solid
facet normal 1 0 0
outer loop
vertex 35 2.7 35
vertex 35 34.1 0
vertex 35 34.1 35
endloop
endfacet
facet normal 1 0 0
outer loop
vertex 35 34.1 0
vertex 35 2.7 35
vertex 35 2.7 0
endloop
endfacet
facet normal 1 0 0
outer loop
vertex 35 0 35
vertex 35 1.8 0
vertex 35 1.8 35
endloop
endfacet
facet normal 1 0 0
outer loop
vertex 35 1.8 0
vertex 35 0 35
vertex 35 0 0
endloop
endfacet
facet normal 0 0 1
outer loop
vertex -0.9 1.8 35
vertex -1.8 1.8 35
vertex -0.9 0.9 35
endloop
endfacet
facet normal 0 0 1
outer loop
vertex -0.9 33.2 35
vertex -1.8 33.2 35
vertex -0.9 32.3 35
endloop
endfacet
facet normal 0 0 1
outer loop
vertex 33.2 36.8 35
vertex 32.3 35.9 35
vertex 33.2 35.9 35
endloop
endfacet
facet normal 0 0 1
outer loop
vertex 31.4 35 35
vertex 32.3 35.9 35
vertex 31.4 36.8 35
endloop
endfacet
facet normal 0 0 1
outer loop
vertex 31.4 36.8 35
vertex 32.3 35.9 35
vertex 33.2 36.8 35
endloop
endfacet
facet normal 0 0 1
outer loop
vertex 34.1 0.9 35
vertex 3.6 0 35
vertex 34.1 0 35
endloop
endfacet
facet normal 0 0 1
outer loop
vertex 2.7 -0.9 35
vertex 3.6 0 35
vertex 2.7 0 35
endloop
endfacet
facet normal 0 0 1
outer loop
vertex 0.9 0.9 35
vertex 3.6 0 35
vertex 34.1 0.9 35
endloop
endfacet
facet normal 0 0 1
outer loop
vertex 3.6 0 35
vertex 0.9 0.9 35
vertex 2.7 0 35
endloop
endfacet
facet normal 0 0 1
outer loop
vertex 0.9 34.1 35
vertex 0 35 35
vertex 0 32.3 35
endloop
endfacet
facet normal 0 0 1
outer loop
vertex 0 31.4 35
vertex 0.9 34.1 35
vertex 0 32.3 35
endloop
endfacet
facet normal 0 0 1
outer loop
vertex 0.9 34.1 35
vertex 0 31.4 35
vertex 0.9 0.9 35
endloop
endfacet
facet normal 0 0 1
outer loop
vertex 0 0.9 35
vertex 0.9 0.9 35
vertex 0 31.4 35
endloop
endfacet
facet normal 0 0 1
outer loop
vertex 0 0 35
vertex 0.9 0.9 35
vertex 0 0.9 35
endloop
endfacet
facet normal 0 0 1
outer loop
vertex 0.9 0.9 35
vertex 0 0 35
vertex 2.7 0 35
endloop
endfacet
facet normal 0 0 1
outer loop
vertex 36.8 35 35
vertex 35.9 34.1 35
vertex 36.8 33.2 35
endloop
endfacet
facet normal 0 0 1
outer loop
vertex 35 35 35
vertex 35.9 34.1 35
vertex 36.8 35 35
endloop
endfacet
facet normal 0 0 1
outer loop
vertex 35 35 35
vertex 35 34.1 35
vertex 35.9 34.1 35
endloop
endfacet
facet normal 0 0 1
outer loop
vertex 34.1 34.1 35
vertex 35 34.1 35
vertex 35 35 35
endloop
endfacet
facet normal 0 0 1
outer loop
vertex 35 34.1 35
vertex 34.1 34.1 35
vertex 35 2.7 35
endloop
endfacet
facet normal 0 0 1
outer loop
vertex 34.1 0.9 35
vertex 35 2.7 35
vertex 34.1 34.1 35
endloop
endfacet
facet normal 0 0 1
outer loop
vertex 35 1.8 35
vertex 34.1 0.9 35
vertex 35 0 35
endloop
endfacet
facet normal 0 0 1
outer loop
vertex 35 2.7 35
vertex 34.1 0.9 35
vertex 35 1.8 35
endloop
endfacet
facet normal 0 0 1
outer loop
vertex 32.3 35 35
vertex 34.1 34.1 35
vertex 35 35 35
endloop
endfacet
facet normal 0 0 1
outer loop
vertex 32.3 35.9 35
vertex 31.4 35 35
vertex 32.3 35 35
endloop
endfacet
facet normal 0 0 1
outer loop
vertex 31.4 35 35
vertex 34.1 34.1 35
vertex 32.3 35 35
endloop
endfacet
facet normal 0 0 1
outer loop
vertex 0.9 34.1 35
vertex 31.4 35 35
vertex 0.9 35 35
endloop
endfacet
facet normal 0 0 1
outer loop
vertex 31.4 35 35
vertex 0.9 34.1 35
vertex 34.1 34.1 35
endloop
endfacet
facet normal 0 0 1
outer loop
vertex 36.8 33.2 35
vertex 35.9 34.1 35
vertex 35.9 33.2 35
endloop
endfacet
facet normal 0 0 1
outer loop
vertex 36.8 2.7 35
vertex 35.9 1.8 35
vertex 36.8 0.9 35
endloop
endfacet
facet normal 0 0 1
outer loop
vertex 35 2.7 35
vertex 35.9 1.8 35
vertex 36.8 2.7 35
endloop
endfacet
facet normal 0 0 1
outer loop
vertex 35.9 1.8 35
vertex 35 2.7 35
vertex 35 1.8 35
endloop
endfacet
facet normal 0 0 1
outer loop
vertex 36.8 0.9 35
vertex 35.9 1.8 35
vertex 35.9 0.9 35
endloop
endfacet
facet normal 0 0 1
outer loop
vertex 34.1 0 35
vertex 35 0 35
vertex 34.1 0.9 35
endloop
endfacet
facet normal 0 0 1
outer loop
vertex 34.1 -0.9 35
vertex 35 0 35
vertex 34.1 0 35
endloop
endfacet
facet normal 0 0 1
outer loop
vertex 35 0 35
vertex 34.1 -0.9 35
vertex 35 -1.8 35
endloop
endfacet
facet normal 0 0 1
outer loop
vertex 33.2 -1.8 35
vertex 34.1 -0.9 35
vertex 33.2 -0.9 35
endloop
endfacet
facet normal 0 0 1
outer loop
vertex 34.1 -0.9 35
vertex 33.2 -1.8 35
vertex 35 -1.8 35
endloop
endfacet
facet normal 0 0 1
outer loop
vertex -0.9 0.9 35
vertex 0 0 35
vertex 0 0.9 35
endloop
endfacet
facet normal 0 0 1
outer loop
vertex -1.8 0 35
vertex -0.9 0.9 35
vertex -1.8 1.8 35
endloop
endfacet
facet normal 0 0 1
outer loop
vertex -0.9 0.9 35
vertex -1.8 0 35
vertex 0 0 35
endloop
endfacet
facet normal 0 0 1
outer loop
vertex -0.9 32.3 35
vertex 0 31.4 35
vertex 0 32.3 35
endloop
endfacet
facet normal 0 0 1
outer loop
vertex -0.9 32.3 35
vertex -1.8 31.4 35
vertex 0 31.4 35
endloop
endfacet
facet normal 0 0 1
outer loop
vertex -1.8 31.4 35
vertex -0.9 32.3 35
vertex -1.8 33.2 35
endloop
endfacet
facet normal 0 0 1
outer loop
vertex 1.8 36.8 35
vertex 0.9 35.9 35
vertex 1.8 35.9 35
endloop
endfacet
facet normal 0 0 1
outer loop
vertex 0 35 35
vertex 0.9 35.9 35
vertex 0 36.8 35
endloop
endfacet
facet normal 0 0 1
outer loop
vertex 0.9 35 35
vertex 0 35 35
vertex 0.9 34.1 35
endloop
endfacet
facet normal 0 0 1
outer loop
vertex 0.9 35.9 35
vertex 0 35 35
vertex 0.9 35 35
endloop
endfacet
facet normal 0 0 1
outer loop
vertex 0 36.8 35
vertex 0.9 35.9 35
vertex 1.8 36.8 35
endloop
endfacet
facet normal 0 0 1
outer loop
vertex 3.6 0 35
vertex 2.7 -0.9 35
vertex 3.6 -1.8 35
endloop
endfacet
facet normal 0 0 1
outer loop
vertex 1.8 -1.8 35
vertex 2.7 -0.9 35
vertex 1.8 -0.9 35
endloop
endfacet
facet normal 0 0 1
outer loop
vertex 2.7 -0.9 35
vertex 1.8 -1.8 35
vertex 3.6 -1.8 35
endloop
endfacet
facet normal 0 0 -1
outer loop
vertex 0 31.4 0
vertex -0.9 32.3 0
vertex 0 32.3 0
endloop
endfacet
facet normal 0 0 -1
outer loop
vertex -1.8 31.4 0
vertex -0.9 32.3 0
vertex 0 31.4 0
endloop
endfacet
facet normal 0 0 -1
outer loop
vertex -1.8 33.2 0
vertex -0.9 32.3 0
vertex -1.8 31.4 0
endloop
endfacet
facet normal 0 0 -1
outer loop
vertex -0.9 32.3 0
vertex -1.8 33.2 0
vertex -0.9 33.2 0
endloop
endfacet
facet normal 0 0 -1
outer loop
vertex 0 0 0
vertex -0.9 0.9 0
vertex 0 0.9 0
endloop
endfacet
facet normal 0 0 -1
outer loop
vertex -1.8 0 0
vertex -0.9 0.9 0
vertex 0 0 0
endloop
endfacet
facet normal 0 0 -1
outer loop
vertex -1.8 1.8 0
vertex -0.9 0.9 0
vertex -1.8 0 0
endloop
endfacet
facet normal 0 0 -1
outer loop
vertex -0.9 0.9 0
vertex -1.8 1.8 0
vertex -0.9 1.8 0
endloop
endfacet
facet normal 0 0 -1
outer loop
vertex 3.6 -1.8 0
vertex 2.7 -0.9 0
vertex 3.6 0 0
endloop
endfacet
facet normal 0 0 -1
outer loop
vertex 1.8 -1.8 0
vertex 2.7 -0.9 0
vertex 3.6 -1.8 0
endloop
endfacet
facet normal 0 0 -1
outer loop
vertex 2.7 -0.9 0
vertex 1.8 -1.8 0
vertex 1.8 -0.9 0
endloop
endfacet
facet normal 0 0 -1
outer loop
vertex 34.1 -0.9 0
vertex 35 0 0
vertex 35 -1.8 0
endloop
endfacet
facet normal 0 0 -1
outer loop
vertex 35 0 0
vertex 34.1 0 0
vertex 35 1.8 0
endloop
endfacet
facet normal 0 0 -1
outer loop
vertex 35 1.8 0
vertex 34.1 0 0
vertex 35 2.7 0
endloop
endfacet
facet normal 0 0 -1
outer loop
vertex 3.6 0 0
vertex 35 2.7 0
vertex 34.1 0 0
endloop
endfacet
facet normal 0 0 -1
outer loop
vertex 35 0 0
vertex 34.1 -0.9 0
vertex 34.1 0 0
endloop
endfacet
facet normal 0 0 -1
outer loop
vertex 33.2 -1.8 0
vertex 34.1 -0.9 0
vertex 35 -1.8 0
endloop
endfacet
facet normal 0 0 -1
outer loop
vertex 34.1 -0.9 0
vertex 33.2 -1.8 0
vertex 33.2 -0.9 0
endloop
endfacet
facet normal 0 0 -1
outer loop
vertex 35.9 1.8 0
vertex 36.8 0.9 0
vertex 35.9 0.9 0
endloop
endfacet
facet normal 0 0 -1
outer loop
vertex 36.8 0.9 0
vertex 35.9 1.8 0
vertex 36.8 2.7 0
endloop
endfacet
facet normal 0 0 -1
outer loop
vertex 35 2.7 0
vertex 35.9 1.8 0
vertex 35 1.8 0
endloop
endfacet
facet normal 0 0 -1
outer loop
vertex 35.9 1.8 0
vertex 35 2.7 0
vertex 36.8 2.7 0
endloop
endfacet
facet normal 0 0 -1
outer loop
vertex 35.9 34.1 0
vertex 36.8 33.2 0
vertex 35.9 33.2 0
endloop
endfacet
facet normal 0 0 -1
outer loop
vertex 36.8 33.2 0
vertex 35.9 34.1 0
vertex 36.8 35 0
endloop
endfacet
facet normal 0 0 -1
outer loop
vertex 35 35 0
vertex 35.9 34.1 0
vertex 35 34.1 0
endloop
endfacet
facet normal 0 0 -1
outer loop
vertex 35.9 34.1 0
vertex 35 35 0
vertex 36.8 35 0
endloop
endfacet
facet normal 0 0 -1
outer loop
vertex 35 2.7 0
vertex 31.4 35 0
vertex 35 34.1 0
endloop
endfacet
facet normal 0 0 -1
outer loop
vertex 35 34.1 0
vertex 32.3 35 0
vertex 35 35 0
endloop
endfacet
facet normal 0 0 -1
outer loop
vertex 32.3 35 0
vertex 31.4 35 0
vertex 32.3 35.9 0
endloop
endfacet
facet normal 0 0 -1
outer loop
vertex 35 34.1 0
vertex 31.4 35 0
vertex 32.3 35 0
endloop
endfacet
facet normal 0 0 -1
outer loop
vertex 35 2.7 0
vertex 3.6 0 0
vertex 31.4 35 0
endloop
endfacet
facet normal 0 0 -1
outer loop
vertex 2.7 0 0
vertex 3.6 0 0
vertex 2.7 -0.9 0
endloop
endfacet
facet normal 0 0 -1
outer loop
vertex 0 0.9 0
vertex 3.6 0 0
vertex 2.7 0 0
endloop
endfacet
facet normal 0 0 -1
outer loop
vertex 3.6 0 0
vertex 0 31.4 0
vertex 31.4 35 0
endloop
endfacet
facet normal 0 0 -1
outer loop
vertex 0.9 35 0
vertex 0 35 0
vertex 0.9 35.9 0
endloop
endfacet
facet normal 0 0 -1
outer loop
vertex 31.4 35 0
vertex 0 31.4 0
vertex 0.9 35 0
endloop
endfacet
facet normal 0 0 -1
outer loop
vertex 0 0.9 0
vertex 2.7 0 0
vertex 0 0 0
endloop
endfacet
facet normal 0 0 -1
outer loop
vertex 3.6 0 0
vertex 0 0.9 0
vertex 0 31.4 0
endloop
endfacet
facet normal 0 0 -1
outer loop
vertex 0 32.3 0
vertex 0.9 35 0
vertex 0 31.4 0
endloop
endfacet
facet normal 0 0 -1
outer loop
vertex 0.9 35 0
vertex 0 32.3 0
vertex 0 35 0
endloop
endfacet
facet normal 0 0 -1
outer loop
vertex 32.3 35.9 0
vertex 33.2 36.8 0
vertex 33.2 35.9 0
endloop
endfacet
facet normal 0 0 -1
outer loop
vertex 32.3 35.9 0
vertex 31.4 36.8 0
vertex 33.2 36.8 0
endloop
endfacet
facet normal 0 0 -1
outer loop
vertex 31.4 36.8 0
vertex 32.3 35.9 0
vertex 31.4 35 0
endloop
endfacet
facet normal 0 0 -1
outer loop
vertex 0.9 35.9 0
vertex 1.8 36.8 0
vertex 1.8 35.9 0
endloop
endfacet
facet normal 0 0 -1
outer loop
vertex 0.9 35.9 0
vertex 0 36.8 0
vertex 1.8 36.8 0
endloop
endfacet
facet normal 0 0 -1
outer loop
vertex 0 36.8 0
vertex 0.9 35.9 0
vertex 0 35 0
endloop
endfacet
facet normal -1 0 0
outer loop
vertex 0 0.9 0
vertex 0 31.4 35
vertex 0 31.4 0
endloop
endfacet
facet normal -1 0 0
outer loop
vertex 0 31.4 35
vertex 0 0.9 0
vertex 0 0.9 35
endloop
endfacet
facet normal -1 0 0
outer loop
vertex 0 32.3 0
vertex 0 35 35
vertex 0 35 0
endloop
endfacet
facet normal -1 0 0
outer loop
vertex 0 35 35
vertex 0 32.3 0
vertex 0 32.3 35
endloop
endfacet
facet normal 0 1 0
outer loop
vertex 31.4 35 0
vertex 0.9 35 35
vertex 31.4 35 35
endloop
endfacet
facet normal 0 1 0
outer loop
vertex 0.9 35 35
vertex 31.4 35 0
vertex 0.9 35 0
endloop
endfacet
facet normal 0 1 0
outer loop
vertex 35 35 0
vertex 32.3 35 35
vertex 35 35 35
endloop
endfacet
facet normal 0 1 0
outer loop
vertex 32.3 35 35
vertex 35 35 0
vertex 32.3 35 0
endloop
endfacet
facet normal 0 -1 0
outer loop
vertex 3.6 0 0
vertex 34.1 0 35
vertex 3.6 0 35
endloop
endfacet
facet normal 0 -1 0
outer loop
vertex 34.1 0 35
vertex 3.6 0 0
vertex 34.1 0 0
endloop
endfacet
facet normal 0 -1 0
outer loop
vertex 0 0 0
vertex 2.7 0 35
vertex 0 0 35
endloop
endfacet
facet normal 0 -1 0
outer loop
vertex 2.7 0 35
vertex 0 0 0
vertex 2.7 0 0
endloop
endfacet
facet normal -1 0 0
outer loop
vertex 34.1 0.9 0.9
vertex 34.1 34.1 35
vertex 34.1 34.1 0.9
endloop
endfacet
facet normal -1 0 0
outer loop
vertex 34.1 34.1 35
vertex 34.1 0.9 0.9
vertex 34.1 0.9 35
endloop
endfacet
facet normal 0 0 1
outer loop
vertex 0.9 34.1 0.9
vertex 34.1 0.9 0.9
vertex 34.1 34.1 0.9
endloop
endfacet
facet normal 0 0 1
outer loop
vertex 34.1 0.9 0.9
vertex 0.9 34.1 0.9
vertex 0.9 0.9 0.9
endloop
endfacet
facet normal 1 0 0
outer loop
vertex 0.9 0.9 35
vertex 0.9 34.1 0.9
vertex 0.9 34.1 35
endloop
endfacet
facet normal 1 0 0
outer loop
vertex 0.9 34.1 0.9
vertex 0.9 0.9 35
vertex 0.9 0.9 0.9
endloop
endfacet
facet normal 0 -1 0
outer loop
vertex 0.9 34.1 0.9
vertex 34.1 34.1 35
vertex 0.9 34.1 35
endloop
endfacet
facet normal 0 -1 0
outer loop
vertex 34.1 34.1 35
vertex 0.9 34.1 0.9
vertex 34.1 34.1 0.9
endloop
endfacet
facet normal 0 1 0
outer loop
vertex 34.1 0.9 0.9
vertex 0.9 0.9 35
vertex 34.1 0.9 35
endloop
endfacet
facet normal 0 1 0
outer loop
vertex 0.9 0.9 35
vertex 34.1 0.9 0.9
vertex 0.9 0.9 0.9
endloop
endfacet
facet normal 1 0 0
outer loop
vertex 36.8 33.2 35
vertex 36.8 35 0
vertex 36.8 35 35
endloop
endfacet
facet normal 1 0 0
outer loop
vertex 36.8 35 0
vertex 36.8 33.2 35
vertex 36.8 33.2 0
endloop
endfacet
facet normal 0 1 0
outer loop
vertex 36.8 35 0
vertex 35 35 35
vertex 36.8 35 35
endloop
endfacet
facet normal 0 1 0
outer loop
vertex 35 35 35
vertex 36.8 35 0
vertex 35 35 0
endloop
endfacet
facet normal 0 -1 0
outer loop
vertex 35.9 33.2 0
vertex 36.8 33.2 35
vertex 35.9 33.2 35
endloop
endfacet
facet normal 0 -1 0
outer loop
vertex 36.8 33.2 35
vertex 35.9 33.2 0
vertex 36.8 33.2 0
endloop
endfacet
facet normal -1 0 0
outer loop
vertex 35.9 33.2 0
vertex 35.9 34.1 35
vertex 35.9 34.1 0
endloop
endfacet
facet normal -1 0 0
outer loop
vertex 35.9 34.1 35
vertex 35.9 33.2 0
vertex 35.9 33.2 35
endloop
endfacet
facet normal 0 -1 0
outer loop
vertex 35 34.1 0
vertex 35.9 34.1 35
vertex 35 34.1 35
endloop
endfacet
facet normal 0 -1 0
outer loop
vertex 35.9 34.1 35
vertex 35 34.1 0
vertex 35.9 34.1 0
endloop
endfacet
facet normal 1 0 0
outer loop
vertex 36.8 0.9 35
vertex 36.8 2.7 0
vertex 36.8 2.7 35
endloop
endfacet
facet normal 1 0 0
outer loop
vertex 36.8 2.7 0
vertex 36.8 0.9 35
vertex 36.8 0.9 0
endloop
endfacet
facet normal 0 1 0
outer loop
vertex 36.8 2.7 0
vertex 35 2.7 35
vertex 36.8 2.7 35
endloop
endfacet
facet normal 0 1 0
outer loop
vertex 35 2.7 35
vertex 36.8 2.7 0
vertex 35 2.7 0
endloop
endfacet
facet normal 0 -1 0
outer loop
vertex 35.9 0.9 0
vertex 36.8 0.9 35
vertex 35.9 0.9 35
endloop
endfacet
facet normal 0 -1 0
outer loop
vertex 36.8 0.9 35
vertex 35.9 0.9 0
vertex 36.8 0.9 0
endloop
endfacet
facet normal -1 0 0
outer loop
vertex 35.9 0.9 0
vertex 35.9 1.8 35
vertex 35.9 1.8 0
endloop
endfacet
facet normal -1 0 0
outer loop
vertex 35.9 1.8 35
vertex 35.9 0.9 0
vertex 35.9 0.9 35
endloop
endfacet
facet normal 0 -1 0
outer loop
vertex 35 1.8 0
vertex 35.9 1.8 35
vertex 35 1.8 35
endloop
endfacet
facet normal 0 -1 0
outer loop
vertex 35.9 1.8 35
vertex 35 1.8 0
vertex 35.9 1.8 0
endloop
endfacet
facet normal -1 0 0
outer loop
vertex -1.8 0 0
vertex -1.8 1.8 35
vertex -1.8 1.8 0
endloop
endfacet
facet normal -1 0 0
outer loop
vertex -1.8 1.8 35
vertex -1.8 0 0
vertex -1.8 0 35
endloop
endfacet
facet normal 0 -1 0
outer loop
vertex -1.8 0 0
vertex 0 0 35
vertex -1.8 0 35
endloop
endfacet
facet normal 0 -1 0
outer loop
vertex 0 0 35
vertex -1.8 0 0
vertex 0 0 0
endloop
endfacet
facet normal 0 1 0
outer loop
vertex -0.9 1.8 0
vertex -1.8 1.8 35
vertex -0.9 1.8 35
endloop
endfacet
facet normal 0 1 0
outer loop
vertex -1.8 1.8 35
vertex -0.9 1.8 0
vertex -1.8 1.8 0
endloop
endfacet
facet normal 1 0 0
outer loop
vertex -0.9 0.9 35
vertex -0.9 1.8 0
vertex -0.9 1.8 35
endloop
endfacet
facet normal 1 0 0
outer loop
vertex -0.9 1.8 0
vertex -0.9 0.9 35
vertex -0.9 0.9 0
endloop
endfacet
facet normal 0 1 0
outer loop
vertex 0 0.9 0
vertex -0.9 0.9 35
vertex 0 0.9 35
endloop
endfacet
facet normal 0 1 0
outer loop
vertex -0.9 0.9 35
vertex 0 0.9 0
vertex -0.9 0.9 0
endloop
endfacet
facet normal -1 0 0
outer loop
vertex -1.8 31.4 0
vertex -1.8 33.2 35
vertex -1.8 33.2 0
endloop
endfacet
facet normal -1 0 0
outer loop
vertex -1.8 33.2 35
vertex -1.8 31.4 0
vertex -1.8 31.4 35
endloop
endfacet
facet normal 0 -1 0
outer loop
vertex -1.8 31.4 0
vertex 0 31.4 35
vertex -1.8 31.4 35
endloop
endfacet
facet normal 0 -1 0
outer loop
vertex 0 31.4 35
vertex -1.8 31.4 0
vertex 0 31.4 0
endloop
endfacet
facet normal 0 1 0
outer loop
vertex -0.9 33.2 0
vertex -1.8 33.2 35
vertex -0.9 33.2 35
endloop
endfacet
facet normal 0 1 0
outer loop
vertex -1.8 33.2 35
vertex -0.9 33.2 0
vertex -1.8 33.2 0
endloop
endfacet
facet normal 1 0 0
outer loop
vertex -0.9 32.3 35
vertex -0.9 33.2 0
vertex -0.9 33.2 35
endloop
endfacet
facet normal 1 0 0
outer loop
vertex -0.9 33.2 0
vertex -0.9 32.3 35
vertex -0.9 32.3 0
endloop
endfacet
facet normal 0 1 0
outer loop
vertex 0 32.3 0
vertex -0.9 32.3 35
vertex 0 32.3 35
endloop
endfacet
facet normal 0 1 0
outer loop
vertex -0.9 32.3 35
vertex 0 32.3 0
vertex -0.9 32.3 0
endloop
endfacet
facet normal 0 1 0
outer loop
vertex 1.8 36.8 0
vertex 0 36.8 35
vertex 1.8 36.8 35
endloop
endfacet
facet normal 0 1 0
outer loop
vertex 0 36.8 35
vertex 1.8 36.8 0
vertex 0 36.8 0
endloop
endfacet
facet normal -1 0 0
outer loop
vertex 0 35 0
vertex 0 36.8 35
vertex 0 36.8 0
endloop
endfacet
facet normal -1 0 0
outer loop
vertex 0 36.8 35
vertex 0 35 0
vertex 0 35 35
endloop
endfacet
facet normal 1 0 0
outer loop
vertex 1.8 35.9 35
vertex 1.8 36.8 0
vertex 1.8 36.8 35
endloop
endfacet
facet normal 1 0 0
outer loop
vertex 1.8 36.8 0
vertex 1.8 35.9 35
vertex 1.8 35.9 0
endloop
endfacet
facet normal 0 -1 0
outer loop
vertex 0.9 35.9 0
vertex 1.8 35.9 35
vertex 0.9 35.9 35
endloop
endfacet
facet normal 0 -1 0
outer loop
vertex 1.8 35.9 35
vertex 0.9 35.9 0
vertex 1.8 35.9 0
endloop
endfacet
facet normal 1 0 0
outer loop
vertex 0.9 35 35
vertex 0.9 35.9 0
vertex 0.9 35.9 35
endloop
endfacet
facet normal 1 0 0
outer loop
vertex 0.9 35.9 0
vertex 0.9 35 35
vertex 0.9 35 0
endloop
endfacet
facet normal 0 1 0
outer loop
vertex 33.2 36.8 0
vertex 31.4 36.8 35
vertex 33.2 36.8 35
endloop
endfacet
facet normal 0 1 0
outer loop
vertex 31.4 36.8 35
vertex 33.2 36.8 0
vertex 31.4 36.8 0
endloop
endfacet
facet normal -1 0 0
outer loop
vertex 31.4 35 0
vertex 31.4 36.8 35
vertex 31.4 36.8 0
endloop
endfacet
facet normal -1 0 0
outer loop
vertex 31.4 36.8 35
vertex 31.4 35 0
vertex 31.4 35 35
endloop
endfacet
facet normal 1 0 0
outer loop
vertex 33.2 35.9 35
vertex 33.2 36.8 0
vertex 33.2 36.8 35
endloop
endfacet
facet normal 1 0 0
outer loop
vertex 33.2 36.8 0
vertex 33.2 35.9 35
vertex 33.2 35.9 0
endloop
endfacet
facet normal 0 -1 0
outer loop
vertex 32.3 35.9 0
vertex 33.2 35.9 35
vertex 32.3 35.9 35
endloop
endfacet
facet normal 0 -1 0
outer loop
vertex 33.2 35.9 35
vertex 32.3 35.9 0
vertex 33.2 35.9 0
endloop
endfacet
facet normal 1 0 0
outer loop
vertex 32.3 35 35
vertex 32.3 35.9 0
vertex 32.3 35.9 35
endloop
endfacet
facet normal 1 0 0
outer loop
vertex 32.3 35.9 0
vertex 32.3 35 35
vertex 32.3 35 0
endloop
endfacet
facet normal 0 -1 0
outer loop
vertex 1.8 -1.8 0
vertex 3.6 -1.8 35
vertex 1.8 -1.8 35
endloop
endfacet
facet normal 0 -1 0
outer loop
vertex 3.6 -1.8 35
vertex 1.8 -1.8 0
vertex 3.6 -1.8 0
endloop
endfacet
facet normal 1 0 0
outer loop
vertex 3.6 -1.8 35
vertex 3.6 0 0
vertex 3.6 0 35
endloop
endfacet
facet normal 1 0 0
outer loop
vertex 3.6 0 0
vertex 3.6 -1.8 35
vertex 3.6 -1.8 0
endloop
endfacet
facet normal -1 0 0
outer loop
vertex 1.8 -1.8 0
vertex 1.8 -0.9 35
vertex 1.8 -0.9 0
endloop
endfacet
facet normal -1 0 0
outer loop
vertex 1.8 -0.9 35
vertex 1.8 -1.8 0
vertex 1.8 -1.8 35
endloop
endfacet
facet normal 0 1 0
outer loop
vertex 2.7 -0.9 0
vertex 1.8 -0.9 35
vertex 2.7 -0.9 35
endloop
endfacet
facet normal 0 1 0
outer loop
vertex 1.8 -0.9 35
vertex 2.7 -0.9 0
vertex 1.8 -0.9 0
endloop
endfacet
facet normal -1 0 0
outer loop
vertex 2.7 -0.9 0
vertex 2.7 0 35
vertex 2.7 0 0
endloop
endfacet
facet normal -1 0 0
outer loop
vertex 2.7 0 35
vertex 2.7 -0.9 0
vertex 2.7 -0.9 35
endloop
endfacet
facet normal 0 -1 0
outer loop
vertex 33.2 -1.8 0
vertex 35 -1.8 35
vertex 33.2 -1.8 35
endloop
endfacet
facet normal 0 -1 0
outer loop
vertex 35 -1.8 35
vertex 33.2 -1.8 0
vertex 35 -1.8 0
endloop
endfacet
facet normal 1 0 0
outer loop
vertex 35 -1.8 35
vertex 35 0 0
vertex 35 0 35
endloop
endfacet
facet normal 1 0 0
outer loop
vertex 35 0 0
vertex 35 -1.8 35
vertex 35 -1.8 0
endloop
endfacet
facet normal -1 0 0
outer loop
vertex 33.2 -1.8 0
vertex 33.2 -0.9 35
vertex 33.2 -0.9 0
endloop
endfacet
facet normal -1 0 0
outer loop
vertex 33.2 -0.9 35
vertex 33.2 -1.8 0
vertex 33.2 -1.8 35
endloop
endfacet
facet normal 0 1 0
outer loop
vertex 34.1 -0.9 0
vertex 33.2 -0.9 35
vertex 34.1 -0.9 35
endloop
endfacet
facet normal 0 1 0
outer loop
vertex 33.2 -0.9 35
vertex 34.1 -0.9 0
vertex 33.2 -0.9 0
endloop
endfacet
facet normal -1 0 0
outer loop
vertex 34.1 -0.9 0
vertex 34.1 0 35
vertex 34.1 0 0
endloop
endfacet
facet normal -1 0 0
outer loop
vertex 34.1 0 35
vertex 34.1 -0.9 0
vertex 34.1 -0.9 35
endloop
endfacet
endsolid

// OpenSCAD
/*
 * frame1x1.scad
 *
 * Use this frame with `drawer1x1`.
 *
 * Part of the Modular Drawer System.
 *
 * (c) 2015 max thom stahl. Released under the Creative Commons Share-Alike
 * license. See LICENSE for details.
 */

// These settings will move into a header file soon
frame_outer = 35.0;
wall_thickness = 0.9;
frame_inner = frame_outer - 2*wall_thickness;

module tab1x1() {
  difference() {
    cube([2*wall_thickness, 2*wall_thickness, frame_outer]);
    translate([-1, -1, -1]) cube([wall_thickness + 1, wall_thickness + 1, frame_outer + 2]);
  }
}

module frame1x1() {
  difference() {
    cube([frame_outer, frame_outer, frame_outer]);
    translate([wall_thickness, wall_thickness, wall_thickness])
      cube([frame_inner, frame_inner, frame_outer]);
  }
  translate([frame_outer, frame_outer - 2*wall_thickness, 0])
    tab1x1();
  translate([frame_outer, 0 + wall_thickness, 0])
    tab1x1();

  translate([0, 2*wall_thickness, 0])
    rotate([0, 0, 180])
    tab1x1();
  translate([0, frame_outer - 2*wall_thickness, 0])
    rotate([0, 0, 180])
    tab1x1();

  translate([2*wall_thickness, frame_outer, 0])
    rotate([0, 0, 90])
    tab1x1();
  translate([frame_outer - 2*wall_thickness, frame_outer, 0])
    rotate([0, 0, 90])
    tab1x1();

  translate([2*wall_thickness, 0, 0])
    rotate([0, 0, 270])
    tab1x1();
  translate([frame_outer - 2*wall_thickness, 0, 0])
    rotate([0, 0, 270])
    tab1x1();
}

frame1x1();
